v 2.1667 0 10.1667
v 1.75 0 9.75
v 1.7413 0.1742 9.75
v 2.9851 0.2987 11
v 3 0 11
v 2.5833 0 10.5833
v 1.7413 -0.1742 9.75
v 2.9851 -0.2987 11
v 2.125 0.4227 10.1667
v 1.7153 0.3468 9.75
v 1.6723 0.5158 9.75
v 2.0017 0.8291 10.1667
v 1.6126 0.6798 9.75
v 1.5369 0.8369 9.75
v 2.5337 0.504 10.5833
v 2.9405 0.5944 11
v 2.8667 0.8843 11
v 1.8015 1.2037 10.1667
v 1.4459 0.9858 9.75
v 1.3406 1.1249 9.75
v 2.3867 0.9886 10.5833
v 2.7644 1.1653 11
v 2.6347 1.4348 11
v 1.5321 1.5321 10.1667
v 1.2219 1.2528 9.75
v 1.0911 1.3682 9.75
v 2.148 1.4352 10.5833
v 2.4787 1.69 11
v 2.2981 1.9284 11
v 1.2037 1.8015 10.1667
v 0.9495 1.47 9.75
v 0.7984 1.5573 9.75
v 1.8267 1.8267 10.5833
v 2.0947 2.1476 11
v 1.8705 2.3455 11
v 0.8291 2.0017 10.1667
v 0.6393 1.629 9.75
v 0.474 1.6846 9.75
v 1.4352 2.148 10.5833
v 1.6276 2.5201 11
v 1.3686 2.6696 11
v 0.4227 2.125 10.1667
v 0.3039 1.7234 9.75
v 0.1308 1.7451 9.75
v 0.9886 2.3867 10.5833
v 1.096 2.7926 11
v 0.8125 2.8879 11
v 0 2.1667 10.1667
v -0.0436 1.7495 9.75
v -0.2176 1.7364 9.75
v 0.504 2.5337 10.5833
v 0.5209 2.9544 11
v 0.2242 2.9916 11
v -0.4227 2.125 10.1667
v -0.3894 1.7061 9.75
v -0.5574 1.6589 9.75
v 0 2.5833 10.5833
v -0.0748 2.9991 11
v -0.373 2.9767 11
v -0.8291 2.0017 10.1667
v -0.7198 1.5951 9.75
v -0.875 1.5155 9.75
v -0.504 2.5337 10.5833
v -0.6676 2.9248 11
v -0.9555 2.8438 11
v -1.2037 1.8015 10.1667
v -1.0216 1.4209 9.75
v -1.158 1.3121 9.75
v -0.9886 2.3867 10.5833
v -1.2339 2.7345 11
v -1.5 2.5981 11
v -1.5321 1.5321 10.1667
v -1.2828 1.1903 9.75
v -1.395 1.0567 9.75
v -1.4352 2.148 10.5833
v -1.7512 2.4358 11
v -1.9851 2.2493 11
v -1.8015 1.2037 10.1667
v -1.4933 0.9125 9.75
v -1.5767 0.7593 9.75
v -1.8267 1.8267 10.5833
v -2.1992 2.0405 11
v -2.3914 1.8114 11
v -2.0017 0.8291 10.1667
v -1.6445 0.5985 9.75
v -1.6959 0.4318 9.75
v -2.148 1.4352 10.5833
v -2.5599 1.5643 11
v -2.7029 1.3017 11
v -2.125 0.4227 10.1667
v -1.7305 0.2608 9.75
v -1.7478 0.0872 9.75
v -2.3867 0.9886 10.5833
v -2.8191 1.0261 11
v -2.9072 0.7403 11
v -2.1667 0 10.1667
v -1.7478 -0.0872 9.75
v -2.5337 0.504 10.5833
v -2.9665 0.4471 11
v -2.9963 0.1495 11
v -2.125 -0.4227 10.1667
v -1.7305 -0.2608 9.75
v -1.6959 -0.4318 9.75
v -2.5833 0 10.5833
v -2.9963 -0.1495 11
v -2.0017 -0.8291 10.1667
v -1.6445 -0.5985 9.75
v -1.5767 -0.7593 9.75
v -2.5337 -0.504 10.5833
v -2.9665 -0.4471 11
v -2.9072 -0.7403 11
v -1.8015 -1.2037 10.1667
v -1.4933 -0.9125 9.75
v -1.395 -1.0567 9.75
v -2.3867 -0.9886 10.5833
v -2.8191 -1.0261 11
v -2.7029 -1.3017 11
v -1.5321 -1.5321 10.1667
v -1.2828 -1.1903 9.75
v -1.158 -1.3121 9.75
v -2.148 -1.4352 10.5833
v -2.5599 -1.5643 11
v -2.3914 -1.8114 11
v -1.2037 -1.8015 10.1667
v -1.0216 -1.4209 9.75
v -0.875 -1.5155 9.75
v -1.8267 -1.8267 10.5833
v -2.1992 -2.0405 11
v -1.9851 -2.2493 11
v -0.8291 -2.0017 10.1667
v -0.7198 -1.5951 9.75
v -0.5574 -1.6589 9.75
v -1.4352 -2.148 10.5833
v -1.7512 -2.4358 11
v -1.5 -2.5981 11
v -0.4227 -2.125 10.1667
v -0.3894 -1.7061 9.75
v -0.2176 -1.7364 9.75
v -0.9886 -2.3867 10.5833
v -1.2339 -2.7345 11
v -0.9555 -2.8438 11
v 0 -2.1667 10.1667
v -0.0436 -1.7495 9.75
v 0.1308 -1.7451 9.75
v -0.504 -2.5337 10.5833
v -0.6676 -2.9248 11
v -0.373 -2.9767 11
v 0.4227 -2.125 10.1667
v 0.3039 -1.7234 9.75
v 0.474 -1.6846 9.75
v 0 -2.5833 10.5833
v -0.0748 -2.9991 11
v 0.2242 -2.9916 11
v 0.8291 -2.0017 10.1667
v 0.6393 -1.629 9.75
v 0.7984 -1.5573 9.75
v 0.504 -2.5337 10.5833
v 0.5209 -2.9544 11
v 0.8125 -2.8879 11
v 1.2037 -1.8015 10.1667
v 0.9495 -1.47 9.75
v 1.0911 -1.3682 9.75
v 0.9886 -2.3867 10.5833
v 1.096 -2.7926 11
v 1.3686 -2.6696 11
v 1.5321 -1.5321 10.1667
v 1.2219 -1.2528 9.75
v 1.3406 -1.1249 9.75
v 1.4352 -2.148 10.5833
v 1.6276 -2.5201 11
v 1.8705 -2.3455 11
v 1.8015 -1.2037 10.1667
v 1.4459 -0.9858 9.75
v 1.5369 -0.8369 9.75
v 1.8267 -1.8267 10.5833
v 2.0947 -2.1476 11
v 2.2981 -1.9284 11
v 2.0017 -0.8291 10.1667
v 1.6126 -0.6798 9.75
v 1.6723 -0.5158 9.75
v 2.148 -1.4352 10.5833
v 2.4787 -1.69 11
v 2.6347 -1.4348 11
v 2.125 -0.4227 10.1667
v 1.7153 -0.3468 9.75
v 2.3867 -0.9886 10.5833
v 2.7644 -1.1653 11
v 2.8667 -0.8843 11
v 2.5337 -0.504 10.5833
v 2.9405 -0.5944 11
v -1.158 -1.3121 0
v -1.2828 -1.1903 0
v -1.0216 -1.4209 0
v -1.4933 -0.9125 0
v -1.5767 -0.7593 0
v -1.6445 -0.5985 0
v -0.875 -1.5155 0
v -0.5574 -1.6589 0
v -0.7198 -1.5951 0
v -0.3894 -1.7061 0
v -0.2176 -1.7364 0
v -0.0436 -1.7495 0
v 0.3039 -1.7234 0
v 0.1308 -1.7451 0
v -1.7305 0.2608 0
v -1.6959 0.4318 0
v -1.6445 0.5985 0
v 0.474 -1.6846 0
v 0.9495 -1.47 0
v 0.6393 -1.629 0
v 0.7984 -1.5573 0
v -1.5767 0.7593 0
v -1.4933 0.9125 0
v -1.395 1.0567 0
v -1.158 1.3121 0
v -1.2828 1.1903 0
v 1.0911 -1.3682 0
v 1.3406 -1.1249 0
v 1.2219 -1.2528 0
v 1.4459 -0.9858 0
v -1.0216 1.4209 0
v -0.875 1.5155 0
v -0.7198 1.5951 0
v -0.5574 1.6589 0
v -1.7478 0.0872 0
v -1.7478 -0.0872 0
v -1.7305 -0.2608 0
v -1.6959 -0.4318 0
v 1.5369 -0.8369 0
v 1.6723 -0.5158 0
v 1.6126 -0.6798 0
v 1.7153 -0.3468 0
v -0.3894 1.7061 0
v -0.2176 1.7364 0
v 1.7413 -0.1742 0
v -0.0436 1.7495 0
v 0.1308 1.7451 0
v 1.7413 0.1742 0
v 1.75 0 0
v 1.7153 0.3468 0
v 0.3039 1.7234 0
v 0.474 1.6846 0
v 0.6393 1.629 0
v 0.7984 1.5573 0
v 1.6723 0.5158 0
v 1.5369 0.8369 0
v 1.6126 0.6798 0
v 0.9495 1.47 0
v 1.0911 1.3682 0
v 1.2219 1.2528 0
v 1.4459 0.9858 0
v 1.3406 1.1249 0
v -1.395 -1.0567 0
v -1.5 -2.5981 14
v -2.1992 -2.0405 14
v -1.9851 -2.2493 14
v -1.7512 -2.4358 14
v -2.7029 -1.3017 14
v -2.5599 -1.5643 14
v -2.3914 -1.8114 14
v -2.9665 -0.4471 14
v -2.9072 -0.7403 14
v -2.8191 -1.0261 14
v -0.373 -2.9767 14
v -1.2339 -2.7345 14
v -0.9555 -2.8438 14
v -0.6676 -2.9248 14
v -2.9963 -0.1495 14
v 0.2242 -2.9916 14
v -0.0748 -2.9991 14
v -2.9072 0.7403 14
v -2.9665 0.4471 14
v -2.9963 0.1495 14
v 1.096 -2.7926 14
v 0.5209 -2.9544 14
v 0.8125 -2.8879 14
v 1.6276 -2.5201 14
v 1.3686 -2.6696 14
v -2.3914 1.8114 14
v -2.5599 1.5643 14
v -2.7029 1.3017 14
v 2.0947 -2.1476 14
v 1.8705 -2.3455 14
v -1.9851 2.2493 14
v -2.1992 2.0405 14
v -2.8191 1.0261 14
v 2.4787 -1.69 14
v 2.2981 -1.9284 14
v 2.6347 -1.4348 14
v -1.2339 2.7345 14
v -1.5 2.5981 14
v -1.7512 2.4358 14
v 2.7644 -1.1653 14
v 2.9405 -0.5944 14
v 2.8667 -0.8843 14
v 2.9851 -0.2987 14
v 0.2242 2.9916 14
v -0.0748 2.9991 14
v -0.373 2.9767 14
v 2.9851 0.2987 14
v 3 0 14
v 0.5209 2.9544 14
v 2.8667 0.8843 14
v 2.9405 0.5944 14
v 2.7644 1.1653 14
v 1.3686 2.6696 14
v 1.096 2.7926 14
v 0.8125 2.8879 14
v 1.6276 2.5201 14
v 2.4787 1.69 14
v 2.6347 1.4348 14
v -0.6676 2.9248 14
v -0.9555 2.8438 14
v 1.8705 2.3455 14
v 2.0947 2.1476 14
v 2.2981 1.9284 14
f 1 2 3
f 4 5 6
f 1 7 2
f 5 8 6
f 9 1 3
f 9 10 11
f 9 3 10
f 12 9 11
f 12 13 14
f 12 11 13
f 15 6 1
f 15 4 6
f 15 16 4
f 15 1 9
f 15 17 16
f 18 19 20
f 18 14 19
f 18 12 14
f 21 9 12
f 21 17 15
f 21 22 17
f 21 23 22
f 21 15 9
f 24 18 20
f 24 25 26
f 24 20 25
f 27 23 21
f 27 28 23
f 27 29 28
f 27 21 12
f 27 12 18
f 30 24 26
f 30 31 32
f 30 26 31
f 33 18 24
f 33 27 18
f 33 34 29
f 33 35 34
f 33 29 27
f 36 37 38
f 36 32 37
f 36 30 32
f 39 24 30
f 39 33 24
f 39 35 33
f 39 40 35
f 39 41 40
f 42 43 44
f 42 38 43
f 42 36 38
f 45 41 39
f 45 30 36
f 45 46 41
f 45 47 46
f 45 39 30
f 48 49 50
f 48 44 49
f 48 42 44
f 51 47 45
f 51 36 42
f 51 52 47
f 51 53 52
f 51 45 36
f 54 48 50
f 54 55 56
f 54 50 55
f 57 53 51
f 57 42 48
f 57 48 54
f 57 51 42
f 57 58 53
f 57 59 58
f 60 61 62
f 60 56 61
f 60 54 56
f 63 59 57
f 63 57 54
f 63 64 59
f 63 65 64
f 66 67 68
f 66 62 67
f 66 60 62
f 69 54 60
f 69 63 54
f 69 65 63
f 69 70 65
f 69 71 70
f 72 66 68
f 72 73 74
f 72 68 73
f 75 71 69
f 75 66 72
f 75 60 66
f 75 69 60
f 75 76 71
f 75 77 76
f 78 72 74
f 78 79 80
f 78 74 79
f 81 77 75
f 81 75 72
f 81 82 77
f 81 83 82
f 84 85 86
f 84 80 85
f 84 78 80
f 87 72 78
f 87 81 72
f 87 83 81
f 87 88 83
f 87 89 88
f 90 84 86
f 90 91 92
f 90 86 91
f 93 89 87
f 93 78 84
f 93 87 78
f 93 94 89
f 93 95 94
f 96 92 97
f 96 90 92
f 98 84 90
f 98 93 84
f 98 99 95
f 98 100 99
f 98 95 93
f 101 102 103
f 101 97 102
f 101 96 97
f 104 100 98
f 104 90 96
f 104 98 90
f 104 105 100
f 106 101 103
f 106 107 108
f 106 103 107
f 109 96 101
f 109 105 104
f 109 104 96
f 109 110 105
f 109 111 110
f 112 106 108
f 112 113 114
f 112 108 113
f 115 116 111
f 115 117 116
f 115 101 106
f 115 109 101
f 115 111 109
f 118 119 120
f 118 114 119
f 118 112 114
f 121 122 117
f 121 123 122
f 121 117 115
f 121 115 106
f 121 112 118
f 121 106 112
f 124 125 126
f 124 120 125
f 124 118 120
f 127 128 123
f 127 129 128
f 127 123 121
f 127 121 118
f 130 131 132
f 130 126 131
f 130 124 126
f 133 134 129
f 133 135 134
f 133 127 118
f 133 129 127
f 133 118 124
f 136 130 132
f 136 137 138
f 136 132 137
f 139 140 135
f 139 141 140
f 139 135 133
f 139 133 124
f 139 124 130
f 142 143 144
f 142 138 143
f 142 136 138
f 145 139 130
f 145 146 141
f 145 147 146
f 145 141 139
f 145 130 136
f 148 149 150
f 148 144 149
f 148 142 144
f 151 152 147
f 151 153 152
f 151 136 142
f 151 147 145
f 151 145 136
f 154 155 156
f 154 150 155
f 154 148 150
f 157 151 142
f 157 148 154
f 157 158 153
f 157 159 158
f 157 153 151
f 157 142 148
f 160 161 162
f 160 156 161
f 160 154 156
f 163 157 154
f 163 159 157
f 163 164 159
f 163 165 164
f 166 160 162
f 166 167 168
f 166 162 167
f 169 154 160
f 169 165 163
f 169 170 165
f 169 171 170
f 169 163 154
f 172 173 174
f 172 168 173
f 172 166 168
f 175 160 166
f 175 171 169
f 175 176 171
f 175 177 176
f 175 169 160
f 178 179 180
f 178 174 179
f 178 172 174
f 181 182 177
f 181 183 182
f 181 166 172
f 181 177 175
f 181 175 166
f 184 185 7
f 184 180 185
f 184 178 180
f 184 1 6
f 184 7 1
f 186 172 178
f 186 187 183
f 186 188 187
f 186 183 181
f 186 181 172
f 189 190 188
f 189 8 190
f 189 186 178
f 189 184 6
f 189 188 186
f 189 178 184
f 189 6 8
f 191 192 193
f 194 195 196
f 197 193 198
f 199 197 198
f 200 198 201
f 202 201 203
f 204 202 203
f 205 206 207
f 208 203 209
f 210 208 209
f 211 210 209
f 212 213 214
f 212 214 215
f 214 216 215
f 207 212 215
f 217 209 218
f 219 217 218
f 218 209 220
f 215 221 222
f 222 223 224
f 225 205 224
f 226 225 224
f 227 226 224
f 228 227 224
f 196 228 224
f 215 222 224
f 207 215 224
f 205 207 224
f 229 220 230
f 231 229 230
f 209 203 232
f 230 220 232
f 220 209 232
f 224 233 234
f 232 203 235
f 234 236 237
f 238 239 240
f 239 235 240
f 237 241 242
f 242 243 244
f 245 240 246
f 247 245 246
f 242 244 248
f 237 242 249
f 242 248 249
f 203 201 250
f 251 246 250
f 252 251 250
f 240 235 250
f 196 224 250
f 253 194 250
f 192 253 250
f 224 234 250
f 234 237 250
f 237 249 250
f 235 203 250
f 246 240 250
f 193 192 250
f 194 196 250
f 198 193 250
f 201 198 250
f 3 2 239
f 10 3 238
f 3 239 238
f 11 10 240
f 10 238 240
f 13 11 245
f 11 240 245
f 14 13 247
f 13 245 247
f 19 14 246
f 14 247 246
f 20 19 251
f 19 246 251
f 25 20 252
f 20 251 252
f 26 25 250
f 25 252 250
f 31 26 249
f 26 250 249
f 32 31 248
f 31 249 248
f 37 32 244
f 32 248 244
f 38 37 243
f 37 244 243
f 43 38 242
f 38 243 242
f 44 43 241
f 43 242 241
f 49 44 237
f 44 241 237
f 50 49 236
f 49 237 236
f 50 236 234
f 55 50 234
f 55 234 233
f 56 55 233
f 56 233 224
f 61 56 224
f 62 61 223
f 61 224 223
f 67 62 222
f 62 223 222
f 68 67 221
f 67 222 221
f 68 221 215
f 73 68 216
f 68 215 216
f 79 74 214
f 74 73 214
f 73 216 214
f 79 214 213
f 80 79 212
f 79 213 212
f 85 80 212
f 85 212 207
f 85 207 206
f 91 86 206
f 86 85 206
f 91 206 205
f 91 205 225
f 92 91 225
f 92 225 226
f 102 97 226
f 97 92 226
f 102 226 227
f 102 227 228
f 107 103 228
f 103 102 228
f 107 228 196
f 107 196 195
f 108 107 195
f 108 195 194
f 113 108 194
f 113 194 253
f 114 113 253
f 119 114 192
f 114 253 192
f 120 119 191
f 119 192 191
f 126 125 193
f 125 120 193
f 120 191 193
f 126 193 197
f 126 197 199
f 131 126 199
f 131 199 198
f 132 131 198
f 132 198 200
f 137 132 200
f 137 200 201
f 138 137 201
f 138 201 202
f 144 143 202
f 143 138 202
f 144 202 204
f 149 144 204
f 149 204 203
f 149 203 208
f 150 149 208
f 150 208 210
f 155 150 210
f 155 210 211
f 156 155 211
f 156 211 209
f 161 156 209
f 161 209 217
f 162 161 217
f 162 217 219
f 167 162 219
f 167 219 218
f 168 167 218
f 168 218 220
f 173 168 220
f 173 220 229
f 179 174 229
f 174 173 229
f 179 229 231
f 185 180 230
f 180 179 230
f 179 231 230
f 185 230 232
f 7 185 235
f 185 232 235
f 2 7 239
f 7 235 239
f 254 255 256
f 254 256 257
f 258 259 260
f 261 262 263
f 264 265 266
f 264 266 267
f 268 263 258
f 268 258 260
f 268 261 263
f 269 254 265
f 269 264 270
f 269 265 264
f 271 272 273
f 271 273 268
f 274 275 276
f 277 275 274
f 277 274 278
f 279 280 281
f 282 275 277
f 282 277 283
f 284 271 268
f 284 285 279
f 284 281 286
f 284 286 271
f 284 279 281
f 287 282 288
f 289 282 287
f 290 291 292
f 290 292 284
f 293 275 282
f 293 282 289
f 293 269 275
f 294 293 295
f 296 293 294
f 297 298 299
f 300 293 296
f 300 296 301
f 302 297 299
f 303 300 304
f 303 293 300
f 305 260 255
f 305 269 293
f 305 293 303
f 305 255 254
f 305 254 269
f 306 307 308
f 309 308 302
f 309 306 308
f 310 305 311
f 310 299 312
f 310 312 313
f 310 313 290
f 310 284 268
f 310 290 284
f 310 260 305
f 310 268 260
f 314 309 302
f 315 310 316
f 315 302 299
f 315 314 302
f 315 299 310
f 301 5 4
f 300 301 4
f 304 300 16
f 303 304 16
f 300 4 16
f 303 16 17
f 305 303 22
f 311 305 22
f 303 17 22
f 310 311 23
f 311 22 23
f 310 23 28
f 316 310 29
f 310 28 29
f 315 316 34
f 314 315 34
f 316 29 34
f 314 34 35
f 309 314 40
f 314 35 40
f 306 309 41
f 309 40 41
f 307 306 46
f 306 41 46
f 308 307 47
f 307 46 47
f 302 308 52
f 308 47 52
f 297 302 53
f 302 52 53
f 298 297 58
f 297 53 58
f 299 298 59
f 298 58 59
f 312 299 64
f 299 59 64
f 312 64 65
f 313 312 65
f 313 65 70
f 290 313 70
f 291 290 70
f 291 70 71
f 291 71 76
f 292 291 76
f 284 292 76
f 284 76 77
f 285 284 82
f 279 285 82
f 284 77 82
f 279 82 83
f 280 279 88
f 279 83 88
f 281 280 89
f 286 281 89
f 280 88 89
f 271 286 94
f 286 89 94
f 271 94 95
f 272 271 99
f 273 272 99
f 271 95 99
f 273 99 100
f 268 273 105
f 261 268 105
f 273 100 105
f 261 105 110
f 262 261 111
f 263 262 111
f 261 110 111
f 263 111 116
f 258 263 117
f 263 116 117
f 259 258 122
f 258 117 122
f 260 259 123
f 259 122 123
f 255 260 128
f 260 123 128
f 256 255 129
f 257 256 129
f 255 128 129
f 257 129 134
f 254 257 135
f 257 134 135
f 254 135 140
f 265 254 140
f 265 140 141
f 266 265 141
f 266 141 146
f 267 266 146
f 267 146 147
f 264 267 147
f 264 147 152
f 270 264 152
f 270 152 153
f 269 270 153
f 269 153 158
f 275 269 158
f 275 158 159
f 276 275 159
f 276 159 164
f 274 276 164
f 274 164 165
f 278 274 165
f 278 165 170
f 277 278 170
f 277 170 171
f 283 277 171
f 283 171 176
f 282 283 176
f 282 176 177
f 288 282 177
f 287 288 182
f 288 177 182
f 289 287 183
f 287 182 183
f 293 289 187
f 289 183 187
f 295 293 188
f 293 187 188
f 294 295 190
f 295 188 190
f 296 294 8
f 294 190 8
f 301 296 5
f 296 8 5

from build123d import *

# Parameters (mm, degrees)
CYLINDER002_R     = 1.75
CYLINDER002_DEPTH = 10
CYLINDER003_R     = 3
CYLINDER003_DEPTH = 3


with BuildPart() as cone:
    # Cone → Cone (revolve)
    with BuildSketch(Plane(origin=(0, 0, 9), x_dir=(1, 0, 0), z_dir=(0, -1, 0))):
        Polygon((0, 0), (1, 0), (3, 2), (0, 2), align=None)
    revolve(axis=Axis((0, 0, 9), (0, 0, 1)))


with BuildPart() as cylinder002:
    # Cylinder002 → Cylinder002 (new body)
    with BuildSketch(Plane.XY):
        Circle(CYLINDER002_R)
    extrude(amount=CYLINDER002_DEPTH)


with BuildPart() as fusion002:
    # Cylinder003 → Cylinder003 (new body)
    with BuildSketch(Plane.XY.offset(11)):
        Circle(CYLINDER003_R)
    extrude(amount=CYLINDER003_DEPTH)

    # Fusion002: union Cone, Cylinder002
    add(cone.part)
    add(cylinder002.part)


solid = fusion002.part
